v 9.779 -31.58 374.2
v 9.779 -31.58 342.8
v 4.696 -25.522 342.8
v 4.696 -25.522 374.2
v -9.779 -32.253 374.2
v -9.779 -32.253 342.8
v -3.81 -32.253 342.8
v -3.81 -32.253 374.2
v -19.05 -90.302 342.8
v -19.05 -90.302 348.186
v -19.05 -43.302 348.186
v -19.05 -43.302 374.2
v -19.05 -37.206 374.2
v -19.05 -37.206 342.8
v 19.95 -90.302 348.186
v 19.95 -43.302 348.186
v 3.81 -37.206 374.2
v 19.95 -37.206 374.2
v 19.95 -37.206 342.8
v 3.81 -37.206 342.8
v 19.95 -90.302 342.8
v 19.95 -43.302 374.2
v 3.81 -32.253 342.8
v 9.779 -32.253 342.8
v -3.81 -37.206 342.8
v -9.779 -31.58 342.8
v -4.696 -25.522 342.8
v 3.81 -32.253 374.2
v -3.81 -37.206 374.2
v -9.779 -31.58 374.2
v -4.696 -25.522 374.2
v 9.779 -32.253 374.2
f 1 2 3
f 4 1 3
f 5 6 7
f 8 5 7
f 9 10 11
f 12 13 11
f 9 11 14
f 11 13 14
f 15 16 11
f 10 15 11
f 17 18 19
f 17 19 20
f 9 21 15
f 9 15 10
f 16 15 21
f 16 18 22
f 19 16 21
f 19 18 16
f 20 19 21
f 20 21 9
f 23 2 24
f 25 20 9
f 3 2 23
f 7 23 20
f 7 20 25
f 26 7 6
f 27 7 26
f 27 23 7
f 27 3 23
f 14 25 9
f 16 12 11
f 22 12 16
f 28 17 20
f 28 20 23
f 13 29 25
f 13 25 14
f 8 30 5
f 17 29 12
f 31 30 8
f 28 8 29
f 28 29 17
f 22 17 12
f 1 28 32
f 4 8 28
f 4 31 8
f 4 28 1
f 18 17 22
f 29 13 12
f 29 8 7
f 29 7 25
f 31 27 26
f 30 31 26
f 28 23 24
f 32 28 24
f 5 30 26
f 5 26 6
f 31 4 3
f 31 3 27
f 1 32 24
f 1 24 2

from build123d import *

# Parameters (mm, degrees)
BOSS_EXTRUDE1_DEPTH = 457.2
SKETCH2_W           = 42.050956734
SKETCH2_H           = 23.599286926
CUT_EXTRUDE1_DEPTH  = 800
SKETCH3_W           = 114.4
SKETCH3_H           = 56.436670765
BOSS_EXTRUDE2_DEPTH = 10
SKETCH4_W           = 114.4
SKETCH4_H           = 4.244670765
CUT_EXTRUDE2_DEPTH  = 10
SKETCH7_W           = 48.1
SKETCH7_H           = 52.192
CUT_EXTRUDE3_DEPTH  = 42
SKETCH8_W           = 0.9
SKETCH8_H           = 40
CUT_EXTRUDE4_DEPTH  = 90
SPLIT1_START        = 342.8
SPLIT1_DEPTH        = 72.4
SPLIT1_START_2      = 19.95
SPLIT1_2_OUTLINE_W  = 52.192
SPLIT1_2_OUTLINE_H  = 72.4
SPLIT1_2_DEPTH      = 9.1
SPLIT1_START_3      = -19.05
SPLIT1_3_OUTLINE_W  = 17.78
SPLIT1_3_OUTLINE_H  = 72.4
SPLIT1_3_DEPTH      = 48.1
SPLIT1_4_OUTLINE_W  = 34.412
SPLIT1_4_OUTLINE_H  = 72.4
SPLIT1_4_DEPTH      = 9.1
SKETCH9_W           = 43.051140559
SKETCH9_H           = 19.836335545
CUT_EXTRUDE5_DEPTH  = 41
SKETCH10_W          = 39
SKETCH10_H          = 5.38616804
BOSS_EXTRUDE3_DEPTH = 47


# Read off the part's stored shape, not the designer's step: Split1
with BuildPart() as part:
    # Sketch1 → Boss-Extrude1 (new, symmetric)
    with BuildSketch(Plane.XY):
        Polygon((-19.05, 8.89), (19.05, 8.89), (19.05, 2.794), (3.81, 2.794), (3.81, -2.159), (9.779, -2.159), (9.779, -2.8321), (4.695818344, -8.89), (-4.695818344, -8.89), (-9.779, -2.8321), (-9.779, -2.159), (-3.81, -2.159), (-3.81, 2.794), (-19.05, 2.794), align=None)
    boss_extrude1 = extrude(amount=BOSS_EXTRUDE1_DEPTH, both=True)

    # Sketch2 → Cut-Extrude1 (cut)
    with BuildSketch(Plane(origin=(0, 0, -457.2), x_dir=(-1, 0, 0), z_dir=(0, 0, -1))):
        Rectangle(SKETCH2_W, SKETCH2_H)
    cut_extrude1 = extrude(amount=-CUT_EXTRUDE1_DEPTH, mode=Mode.SUBTRACT)

    # Sketch3 → Boss-Extrude2 (add)
    with BuildSketch(Plane(origin=(19.05, 0, 0), x_dir=(0, 0, -1), z_dir=(1, 0, 0))):
        with Locations((-400, -19.328335383)):
            Rectangle(SKETCH3_W, SKETCH3_H)
    extrude(amount=BOSS_EXTRUDE2_DEPTH)

    # Mirror1: Boss-Extrude1, Cut-Extrude1 across plane
    add(boss_extrude1.mirror(Plane(origin=(0, -17.206, 0), x_dir=(0, 0, 1), z_dir=(0, -1, 0))))
    add(cut_extrude1.mirror(Plane(origin=(0, -17.206, 0), x_dir=(0, 0, 1), z_dir=(0, -1, 0))), mode=Mode.SUBTRACT)

    # Sketch4 → Cut-Extrude2 (cut)
    with BuildSketch(Plane.ZY.offset(-19.05)):
        with Locations((400, -45.424335383)):
            Rectangle(SKETCH4_W, SKETCH4_H)
    extrude(amount=-CUT_EXTRUDE2_DEPTH, mode=Mode.SUBTRACT)

    # Sketch7 → Cut-Extrude3 (cut)
    with BuildSketch(Plane.XY.offset(457.2)):
        with Locations((5, -17.206)):
            Rectangle(SKETCH7_W, SKETCH7_H)
    extrude(amount=-CUT_EXTRUDE3_DEPTH, mode=Mode.SUBTRACT)

    # Sketch8 → Cut-Extrude4 (cut)
    with BuildSketch(Plane(origin=(0, 0, 342.8), x_dir=(-1, 0, 0), z_dir=(0, 0, -1))):
        with Locations((-19.5, -17.206)):
            Rectangle(SKETCH8_W, SKETCH8_H)
    extrude(amount=-CUT_EXTRUDE4_DEPTH, mode=Mode.SUBTRACT)

    # Split1 3 outline → Split1 3 (cut)
    with BuildSketch(Plane.YZ.offset(SPLIT1_START_3)):
        with Locations((0, 379)):
            Rectangle(SPLIT1_3_OUTLINE_W, SPLIT1_3_OUTLINE_H)
    extrude(amount=SPLIT1_3_DEPTH, mode=Mode.SUBTRACT)

    # Split1 4 outline → Split1 4 (cut)
    with BuildSketch(Plane.YZ.offset(SPLIT1_START_2)):
        with Locations((-26.096, 379)):
            Rectangle(SPLIT1_4_OUTLINE_W, SPLIT1_4_OUTLINE_H)
    extrude(amount=SPLIT1_4_DEPTH, mode=Mode.SUBTRACT)


with BuildPart() as body_2:
    # Split1 outline → Split1 (new body)
    with BuildSketch(Plane.XY.offset(SPLIT1_START)):
        Polygon((19.95, 2.794), (19.95, 8.89), (-19.05, 8.89), (-19.05, 2.794), (-3.81, 2.794), (-3.81, -2.159), (-9.779, -2.159), (-9.779, -2.8321), (-4.695818344, -8.89), (4.695818344, -8.89), (9.779, -2.8321), (9.779, -2.159), (3.81, -2.159), (3.81, 2.794), align=None)
    extrude(amount=SPLIT1_DEPTH)


with BuildPart() as body_3:
    # Split1 2 outline → Split1 2 (new body)
    with BuildSketch(Plane.YZ.offset(SPLIT1_START_2)):
        with Locations((-17.206, 379)):
            Rectangle(SPLIT1_2_OUTLINE_W, SPLIT1_2_OUTLINE_H)
    extrude(amount=SPLIT1_2_DEPTH)


with BuildPart() as part_1:
    add(part.part)

    # Combine1: cut body 3, body 2
    add(body_3.part, mode=Mode.SUBTRACT)
    add(body_2.part, mode=Mode.SUBTRACT)

    # Sketch9 → Cut-Extrude5 (cut)
    with BuildSketch(Plane.XY.offset(415.2)):
        with Locations((2.47557028, -33.383832228)):
            Rectangle(SKETCH9_W, SKETCH9_H)
    extrude(amount=-CUT_EXTRUDE5_DEPTH, mode=Mode.SUBTRACT)

    # Sketch10 → Boss-Extrude3 (add)
    with BuildSketch(Plane(origin=(0, -43.302, 0), x_dir=(-1, 0, 0), z_dir=(0, -1, 0))):
        with Locations((-0.45, -345.49308402)):
            Rectangle(SKETCH10_W, SKETCH10_H)
    extrude(amount=BOSS_EXTRUDE3_DEPTH)


solid = part_1.part
